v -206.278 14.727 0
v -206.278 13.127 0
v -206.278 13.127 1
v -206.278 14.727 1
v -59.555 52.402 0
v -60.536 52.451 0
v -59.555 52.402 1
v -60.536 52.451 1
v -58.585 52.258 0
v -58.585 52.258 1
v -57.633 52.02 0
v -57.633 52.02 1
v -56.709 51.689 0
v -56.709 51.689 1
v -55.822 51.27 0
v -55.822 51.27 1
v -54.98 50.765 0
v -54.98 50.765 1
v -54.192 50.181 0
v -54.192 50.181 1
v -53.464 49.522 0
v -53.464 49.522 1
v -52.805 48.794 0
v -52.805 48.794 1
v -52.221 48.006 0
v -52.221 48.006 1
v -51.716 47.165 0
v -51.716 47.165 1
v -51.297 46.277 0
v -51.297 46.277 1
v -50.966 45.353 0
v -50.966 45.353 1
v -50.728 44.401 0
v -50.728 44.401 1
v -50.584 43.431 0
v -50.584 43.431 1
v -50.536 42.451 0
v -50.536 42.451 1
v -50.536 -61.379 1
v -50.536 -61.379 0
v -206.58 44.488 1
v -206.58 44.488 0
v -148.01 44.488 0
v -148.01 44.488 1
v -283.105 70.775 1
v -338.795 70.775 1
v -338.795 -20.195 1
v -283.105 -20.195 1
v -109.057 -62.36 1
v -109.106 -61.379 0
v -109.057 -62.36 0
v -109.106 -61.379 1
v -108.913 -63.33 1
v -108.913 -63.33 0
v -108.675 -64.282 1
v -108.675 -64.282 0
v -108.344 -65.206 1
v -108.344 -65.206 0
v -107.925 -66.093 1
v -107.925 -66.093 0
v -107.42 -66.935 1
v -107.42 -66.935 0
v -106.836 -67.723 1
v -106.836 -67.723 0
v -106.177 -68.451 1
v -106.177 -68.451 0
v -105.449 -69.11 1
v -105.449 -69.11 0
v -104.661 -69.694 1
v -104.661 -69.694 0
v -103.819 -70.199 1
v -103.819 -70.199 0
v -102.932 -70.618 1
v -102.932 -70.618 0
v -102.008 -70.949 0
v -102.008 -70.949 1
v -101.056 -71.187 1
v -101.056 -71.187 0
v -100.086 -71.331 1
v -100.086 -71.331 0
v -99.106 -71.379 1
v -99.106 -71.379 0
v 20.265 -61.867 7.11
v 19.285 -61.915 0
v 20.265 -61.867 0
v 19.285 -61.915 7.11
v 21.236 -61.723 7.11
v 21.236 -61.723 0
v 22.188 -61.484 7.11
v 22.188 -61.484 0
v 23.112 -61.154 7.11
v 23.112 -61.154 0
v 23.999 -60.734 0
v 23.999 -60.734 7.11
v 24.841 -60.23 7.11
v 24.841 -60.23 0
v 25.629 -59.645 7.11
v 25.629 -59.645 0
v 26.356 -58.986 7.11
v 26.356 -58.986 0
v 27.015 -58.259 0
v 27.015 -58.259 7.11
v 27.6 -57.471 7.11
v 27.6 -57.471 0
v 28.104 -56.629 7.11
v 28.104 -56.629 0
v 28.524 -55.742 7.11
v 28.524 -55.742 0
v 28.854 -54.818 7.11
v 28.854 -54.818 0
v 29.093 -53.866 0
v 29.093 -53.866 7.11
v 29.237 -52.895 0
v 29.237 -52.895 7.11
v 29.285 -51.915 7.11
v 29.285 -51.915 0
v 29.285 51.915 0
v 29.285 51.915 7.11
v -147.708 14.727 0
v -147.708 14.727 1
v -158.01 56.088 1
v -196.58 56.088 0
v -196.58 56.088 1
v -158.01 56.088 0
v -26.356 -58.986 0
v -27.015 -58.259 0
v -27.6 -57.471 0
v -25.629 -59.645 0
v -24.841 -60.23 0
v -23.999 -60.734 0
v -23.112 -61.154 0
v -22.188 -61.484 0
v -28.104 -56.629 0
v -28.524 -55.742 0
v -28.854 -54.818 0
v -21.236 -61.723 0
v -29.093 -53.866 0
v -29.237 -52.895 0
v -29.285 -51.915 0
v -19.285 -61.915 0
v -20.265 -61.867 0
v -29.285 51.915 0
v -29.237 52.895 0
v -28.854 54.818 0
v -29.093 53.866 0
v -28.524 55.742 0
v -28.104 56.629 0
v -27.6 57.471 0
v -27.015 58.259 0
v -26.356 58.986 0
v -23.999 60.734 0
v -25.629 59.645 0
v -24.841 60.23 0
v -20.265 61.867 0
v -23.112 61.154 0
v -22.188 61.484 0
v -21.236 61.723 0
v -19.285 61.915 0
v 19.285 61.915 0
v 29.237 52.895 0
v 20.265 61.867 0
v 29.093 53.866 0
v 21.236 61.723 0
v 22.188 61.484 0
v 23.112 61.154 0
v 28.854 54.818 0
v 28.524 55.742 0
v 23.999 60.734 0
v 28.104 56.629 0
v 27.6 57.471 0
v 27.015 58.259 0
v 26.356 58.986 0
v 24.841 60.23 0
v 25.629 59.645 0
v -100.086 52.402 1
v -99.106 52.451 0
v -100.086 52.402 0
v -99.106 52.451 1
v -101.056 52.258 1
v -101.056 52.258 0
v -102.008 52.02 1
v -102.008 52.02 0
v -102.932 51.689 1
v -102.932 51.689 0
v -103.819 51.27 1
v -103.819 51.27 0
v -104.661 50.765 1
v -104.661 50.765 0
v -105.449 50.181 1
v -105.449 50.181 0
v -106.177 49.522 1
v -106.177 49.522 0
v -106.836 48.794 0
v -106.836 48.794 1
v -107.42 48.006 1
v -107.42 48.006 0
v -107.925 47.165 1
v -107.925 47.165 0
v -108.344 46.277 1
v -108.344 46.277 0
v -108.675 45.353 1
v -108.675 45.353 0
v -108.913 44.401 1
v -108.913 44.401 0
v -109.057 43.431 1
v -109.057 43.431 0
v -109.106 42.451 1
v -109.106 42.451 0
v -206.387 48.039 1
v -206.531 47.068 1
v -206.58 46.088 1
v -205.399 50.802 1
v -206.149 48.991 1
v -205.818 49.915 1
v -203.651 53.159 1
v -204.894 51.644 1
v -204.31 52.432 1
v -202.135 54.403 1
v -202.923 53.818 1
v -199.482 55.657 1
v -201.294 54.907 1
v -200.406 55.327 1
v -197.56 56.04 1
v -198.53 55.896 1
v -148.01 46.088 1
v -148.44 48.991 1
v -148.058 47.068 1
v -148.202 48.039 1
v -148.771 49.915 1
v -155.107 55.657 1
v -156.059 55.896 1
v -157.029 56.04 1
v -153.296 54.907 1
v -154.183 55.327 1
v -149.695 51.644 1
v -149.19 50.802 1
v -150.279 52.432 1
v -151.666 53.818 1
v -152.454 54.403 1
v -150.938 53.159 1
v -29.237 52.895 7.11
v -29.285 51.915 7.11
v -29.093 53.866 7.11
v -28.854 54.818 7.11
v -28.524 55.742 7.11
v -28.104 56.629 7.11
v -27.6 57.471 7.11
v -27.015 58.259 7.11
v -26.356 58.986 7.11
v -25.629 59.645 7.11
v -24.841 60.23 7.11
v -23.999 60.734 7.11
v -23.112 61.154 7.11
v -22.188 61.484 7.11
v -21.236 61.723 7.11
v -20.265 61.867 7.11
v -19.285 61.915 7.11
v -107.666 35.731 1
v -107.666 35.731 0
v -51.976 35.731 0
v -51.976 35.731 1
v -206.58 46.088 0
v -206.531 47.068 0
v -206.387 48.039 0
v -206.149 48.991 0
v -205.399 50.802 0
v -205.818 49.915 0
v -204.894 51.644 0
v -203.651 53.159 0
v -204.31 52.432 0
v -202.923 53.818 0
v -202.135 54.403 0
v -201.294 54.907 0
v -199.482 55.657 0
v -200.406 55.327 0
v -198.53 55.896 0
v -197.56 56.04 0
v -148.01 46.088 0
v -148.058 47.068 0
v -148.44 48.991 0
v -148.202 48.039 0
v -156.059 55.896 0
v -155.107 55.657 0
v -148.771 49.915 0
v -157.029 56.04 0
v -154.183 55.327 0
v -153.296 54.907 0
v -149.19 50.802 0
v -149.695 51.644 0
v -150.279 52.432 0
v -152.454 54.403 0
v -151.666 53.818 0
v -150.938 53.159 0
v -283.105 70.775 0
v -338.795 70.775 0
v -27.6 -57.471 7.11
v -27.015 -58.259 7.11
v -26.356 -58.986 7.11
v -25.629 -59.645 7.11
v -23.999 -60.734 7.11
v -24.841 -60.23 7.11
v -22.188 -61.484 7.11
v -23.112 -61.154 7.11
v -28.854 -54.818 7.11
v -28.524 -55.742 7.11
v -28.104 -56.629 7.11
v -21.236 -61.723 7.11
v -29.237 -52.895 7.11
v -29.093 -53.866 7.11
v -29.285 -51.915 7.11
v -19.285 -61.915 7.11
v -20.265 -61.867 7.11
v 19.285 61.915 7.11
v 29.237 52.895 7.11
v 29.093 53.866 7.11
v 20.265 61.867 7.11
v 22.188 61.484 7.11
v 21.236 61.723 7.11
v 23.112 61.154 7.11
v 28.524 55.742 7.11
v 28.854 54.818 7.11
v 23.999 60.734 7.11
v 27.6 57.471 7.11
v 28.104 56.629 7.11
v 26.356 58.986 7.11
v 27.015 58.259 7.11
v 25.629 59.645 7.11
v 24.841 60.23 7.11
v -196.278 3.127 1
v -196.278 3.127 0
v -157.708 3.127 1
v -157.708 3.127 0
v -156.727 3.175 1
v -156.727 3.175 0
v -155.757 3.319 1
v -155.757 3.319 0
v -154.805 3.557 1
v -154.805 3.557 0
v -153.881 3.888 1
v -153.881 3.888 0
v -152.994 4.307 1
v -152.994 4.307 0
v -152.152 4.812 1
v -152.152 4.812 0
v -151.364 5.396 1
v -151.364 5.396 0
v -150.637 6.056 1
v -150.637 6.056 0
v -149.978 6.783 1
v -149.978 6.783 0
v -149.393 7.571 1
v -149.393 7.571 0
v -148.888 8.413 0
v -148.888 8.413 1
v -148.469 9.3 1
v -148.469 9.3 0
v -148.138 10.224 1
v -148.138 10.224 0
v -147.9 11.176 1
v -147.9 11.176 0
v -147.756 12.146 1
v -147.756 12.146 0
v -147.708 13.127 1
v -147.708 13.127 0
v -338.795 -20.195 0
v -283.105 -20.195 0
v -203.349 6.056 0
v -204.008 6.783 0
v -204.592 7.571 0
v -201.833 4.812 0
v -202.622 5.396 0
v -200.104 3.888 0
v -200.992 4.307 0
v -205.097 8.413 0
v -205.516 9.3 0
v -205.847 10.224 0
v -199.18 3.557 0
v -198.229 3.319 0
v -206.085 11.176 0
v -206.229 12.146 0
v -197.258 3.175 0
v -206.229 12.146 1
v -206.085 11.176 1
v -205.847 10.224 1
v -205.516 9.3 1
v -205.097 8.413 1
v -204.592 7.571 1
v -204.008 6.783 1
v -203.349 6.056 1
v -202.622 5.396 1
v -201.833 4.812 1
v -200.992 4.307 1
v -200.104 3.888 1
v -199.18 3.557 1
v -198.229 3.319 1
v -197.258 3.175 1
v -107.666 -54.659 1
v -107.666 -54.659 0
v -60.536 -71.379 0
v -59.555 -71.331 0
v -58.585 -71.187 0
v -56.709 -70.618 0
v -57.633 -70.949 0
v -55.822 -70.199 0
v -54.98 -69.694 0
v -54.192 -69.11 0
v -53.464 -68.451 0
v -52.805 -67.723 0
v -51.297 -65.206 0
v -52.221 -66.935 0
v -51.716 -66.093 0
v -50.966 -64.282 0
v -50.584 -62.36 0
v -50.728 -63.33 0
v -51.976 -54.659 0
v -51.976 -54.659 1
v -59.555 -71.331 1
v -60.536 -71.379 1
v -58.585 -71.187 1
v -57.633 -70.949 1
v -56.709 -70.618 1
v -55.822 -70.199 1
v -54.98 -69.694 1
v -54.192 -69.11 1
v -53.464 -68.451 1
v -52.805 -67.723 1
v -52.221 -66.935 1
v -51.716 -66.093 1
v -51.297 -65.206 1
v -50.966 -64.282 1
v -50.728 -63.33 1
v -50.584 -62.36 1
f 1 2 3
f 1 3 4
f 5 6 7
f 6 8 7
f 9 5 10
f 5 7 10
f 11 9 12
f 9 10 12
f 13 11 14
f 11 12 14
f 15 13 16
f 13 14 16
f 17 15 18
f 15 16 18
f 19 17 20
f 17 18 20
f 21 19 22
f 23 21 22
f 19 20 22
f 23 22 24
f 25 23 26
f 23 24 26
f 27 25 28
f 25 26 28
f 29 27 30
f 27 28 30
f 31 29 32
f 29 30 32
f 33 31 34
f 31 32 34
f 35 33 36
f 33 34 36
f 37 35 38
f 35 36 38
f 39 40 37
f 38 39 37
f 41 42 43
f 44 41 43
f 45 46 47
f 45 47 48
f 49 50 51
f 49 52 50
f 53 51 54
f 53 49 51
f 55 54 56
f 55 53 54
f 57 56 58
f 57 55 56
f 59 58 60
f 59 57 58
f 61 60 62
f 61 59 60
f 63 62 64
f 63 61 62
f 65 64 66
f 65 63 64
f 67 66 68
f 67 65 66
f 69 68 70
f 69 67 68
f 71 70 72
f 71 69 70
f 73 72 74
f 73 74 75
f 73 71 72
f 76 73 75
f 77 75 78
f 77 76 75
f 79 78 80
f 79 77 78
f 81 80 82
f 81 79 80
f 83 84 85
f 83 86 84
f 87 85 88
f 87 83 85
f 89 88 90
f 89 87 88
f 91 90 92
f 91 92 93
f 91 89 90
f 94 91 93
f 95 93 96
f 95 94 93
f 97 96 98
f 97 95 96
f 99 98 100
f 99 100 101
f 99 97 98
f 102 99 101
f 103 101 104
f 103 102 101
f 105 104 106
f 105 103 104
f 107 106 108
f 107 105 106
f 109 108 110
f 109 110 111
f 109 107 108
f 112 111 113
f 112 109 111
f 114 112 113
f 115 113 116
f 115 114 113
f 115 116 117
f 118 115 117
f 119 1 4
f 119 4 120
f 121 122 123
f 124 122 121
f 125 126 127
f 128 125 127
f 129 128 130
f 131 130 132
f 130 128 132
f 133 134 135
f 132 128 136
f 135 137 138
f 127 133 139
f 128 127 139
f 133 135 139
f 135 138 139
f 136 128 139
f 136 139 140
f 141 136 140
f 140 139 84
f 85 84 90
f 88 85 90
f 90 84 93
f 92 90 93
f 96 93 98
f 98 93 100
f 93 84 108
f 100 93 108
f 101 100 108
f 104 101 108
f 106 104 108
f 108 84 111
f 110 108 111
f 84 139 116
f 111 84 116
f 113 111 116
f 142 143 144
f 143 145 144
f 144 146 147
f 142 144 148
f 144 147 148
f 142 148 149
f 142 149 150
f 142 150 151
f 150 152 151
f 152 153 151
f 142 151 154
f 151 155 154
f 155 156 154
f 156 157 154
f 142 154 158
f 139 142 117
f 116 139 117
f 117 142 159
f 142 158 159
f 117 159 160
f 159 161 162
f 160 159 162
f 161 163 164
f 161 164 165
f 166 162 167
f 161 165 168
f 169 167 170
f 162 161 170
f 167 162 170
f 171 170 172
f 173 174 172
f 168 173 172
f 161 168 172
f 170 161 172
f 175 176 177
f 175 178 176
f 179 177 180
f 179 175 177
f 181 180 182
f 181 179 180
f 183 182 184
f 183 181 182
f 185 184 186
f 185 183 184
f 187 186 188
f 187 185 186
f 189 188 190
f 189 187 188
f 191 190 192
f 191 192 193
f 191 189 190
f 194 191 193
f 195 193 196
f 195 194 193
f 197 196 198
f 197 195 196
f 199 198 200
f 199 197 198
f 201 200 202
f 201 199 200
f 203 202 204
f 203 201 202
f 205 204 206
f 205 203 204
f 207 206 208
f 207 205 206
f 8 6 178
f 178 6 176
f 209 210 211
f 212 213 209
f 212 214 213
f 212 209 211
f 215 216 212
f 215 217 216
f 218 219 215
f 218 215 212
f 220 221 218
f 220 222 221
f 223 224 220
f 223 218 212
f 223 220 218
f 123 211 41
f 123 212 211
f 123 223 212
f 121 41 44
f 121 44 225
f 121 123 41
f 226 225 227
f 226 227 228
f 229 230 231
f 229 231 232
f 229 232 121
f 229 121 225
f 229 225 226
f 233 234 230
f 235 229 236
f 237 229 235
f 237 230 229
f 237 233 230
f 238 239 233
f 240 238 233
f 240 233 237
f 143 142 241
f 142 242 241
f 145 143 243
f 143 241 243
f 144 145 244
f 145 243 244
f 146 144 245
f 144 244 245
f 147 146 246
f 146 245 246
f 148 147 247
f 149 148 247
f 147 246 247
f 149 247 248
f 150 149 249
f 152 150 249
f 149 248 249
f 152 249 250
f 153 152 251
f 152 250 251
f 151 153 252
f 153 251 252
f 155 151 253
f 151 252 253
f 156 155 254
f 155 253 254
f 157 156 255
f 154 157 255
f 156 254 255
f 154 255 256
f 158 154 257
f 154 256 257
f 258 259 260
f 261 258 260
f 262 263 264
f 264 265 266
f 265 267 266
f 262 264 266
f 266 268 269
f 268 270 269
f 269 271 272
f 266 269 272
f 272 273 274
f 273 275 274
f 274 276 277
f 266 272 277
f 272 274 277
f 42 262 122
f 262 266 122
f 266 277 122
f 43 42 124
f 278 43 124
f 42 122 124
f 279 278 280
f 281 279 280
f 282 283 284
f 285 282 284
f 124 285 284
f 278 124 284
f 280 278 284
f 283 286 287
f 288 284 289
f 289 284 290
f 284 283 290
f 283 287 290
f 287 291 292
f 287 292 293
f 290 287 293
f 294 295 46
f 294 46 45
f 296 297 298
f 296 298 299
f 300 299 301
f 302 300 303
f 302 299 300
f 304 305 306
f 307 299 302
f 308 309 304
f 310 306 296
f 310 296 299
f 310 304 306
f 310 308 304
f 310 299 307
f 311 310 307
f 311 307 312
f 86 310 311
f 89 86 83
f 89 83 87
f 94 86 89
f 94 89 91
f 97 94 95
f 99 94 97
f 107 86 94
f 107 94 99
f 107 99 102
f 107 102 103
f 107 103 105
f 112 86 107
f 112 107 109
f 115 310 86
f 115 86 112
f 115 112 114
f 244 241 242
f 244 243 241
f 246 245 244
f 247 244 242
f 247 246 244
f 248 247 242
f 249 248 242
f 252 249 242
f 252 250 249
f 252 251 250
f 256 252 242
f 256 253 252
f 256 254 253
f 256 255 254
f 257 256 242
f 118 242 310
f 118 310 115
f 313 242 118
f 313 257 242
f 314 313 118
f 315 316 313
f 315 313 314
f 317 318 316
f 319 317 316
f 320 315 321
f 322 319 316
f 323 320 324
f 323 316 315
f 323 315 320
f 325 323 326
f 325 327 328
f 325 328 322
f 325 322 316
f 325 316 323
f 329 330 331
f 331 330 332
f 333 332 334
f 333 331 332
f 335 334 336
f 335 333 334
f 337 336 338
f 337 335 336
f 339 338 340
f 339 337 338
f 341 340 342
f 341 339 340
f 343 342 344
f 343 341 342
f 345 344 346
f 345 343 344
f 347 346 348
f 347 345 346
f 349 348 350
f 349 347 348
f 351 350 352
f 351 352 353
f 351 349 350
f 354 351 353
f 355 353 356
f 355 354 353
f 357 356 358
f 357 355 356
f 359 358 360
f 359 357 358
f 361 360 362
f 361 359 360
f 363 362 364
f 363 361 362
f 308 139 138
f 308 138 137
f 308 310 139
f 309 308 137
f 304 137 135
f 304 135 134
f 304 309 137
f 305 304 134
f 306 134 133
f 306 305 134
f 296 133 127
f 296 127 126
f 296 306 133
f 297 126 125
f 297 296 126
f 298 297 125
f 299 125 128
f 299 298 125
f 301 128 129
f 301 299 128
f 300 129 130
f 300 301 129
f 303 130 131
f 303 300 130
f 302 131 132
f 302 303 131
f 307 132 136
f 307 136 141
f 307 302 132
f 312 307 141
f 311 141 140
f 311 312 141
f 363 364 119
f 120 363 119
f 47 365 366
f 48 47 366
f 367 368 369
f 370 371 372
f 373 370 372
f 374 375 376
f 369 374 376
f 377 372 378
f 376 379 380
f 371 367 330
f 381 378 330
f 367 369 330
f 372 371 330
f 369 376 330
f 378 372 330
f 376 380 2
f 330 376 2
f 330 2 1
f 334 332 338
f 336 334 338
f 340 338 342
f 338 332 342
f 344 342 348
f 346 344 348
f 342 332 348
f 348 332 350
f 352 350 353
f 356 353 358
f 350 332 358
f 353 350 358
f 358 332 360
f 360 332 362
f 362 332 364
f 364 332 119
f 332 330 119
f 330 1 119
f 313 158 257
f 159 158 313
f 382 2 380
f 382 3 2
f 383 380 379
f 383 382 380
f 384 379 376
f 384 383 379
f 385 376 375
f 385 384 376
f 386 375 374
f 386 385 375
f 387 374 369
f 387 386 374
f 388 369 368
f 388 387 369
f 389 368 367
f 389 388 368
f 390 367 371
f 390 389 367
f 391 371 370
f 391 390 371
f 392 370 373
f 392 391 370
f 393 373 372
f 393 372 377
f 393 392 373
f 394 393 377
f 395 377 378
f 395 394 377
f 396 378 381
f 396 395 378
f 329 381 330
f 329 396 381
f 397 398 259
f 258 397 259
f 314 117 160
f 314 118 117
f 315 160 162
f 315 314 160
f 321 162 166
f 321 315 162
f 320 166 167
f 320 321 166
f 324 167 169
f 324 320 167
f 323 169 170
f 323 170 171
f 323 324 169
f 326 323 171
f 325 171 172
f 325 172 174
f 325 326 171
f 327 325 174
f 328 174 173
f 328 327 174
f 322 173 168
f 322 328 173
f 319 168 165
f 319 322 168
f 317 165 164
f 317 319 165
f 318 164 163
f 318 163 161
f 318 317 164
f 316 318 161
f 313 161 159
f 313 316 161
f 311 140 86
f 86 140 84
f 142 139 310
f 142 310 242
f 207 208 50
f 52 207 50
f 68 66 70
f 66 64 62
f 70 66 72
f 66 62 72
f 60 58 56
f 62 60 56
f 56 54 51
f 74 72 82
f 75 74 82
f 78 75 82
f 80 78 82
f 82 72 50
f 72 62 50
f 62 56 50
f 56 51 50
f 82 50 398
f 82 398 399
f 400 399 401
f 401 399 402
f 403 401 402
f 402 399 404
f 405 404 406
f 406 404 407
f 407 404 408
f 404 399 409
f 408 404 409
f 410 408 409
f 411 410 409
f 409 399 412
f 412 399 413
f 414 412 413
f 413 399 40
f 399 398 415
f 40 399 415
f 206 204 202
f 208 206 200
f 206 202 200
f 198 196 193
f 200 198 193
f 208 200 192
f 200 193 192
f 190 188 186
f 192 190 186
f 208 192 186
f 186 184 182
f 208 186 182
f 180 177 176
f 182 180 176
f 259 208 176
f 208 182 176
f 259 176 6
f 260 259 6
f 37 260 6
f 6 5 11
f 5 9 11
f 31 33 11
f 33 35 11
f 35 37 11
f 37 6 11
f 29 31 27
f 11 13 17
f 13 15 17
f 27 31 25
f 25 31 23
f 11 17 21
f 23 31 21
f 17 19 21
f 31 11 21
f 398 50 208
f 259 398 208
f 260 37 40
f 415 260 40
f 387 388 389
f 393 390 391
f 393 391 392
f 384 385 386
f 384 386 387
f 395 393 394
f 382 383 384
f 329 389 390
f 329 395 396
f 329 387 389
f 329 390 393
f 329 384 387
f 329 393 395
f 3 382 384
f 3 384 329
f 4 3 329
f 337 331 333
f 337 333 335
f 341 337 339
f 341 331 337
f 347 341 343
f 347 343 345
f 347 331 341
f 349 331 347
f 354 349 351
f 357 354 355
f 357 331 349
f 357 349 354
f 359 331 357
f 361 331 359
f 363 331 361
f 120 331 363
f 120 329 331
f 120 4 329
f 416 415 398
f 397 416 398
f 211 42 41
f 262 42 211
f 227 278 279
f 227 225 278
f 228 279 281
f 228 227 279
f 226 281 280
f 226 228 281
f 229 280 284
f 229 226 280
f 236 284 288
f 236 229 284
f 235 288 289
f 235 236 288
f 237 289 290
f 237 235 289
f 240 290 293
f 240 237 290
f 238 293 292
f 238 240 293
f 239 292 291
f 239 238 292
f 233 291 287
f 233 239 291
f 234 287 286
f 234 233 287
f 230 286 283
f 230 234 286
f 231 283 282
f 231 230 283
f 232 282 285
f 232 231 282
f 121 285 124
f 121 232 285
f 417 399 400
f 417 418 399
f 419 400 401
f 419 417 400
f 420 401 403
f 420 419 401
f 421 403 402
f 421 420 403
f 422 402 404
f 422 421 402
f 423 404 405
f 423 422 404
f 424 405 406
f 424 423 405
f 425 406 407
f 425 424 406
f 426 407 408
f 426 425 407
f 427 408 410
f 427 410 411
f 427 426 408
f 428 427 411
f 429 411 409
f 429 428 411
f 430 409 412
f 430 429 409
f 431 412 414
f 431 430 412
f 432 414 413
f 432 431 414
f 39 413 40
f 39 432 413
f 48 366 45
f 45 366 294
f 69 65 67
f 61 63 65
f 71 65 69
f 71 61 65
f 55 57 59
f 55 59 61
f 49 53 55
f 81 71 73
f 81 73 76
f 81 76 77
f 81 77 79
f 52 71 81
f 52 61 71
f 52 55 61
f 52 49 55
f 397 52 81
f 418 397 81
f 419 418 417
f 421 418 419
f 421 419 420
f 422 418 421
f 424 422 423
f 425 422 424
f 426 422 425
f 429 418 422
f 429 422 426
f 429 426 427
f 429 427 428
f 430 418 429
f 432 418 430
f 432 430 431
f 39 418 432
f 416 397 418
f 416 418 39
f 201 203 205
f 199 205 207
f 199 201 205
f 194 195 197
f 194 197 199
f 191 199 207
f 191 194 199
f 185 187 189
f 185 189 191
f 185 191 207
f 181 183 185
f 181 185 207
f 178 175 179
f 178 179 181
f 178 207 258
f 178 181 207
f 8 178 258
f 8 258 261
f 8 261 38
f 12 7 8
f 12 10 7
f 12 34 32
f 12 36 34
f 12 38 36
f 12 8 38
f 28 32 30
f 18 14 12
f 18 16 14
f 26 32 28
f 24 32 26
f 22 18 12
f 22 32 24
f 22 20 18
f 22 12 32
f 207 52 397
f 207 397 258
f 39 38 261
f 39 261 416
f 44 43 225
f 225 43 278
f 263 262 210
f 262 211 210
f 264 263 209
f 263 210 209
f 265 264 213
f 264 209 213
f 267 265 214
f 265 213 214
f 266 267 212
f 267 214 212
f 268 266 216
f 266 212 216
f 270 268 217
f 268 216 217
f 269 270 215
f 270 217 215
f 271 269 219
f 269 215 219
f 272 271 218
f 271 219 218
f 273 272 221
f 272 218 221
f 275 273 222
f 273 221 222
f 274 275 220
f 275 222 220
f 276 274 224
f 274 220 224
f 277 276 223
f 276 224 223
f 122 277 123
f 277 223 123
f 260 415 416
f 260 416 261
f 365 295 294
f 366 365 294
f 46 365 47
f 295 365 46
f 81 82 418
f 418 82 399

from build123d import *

# Parameters (mm, degrees)
F0_W      = 58.57
F0_H      = 123.83
F1_DEPTH  = 7.11
F2_R      = 10
F3_W      = 1.44
F3_H      = 90.39
F4_DEPTH  = 1
F5_R      = 10
F6_W      = 58.57
F6_H      = 11.6
F7_DEPTH  = 1
F8_R      = 10
F9_W      = 55.69
F9_H      = 90.97
F10_DEPTH = 1


with BuildPart() as f1:
    # F0 (on Top) → F1 (new body)
    with BuildSketch(Plane.XY):
        Rectangle(F0_W, F0_H)
    extrude(amount=F1_DEPTH)

    # F2
    f2_edges = [f1.edges().sort_by_distance(p)[0] for p in [
        (29.285, -61.915, 3.555),
        (-29.285, -61.915, 3.555),
        (29.285, 61.915, 3.555),
        (-29.285, 61.915, 3.555),
    ]]
    fillet(f2_edges, radius=F2_R)


with BuildPart() as f4:
    # F3 (on Top) → F4 (new body)
    with BuildSketch(Plane.XY):
        Polygon((-50.535517, 52.450562), (-109.105517, 52.450562), (-109.105517, 35.730562), (-107.665517, 35.730562), (-51.975517, 35.730562), (-50.535517, 35.730562), align=None)
        with Locations((-108.385517, -9.464438)):
            Rectangle(F3_W, F3_H)
        with Locations((-51.255517, -9.464438)):
            Rectangle(F3_W, F3_H)
        Polygon((-107.665517, -54.659438), (-109.105517, -54.659438), (-109.105517, -71.379438), (-50.535517, -71.379438), (-50.535517, -54.659438), (-51.975517, -54.659438), align=None)
    extrude(amount=F4_DEPTH)

    # F5
    f5_edges = [f4.edges().sort_by_distance(p)[0] for p in [
        (-109.105517, 52.450562, 0.5),
        (-109.105517, -71.379438, 0.5),
        (-50.535517, -71.379438, 0.5),
        (-50.535517, 52.450562, 0.5),
    ]]
    fillet(f5_edges, radius=F5_R)


with BuildPart() as f7:
    # F6 (on Top) → F7 (new body)
    with BuildSketch(Plane.XY):
        with Locations((-177.294545, 50.287862)):
            Rectangle(F6_W, F6_H)
        with Locations((-176.992626, 8.926573)):
            Rectangle(F6_W, F6_H)
    extrude(amount=F7_DEPTH)

    # F8
    f8_edges = [f7.edges().sort_by_distance(p)[0] for p in [
        (-148.009545, 56.087862, 0.5),
        (-206.579545, 56.087862, 0.5),
        (-206.277626, 3.126573, 0.5),
        (-147.707626, 3.126573, 0.5),
    ]]
    fillet(f8_edges, radius=F8_R)


with BuildPart() as f10:
    # F9 (on Top) → F10 (new body)
    with BuildSketch(Plane.XY):
        with Locations((-310.950011, 25.289991)):
            Rectangle(F9_W, F9_H)
    extrude(amount=F10_DEPTH)


solid = Compound([f1.part, f4.part, f7.part, f10.part])
